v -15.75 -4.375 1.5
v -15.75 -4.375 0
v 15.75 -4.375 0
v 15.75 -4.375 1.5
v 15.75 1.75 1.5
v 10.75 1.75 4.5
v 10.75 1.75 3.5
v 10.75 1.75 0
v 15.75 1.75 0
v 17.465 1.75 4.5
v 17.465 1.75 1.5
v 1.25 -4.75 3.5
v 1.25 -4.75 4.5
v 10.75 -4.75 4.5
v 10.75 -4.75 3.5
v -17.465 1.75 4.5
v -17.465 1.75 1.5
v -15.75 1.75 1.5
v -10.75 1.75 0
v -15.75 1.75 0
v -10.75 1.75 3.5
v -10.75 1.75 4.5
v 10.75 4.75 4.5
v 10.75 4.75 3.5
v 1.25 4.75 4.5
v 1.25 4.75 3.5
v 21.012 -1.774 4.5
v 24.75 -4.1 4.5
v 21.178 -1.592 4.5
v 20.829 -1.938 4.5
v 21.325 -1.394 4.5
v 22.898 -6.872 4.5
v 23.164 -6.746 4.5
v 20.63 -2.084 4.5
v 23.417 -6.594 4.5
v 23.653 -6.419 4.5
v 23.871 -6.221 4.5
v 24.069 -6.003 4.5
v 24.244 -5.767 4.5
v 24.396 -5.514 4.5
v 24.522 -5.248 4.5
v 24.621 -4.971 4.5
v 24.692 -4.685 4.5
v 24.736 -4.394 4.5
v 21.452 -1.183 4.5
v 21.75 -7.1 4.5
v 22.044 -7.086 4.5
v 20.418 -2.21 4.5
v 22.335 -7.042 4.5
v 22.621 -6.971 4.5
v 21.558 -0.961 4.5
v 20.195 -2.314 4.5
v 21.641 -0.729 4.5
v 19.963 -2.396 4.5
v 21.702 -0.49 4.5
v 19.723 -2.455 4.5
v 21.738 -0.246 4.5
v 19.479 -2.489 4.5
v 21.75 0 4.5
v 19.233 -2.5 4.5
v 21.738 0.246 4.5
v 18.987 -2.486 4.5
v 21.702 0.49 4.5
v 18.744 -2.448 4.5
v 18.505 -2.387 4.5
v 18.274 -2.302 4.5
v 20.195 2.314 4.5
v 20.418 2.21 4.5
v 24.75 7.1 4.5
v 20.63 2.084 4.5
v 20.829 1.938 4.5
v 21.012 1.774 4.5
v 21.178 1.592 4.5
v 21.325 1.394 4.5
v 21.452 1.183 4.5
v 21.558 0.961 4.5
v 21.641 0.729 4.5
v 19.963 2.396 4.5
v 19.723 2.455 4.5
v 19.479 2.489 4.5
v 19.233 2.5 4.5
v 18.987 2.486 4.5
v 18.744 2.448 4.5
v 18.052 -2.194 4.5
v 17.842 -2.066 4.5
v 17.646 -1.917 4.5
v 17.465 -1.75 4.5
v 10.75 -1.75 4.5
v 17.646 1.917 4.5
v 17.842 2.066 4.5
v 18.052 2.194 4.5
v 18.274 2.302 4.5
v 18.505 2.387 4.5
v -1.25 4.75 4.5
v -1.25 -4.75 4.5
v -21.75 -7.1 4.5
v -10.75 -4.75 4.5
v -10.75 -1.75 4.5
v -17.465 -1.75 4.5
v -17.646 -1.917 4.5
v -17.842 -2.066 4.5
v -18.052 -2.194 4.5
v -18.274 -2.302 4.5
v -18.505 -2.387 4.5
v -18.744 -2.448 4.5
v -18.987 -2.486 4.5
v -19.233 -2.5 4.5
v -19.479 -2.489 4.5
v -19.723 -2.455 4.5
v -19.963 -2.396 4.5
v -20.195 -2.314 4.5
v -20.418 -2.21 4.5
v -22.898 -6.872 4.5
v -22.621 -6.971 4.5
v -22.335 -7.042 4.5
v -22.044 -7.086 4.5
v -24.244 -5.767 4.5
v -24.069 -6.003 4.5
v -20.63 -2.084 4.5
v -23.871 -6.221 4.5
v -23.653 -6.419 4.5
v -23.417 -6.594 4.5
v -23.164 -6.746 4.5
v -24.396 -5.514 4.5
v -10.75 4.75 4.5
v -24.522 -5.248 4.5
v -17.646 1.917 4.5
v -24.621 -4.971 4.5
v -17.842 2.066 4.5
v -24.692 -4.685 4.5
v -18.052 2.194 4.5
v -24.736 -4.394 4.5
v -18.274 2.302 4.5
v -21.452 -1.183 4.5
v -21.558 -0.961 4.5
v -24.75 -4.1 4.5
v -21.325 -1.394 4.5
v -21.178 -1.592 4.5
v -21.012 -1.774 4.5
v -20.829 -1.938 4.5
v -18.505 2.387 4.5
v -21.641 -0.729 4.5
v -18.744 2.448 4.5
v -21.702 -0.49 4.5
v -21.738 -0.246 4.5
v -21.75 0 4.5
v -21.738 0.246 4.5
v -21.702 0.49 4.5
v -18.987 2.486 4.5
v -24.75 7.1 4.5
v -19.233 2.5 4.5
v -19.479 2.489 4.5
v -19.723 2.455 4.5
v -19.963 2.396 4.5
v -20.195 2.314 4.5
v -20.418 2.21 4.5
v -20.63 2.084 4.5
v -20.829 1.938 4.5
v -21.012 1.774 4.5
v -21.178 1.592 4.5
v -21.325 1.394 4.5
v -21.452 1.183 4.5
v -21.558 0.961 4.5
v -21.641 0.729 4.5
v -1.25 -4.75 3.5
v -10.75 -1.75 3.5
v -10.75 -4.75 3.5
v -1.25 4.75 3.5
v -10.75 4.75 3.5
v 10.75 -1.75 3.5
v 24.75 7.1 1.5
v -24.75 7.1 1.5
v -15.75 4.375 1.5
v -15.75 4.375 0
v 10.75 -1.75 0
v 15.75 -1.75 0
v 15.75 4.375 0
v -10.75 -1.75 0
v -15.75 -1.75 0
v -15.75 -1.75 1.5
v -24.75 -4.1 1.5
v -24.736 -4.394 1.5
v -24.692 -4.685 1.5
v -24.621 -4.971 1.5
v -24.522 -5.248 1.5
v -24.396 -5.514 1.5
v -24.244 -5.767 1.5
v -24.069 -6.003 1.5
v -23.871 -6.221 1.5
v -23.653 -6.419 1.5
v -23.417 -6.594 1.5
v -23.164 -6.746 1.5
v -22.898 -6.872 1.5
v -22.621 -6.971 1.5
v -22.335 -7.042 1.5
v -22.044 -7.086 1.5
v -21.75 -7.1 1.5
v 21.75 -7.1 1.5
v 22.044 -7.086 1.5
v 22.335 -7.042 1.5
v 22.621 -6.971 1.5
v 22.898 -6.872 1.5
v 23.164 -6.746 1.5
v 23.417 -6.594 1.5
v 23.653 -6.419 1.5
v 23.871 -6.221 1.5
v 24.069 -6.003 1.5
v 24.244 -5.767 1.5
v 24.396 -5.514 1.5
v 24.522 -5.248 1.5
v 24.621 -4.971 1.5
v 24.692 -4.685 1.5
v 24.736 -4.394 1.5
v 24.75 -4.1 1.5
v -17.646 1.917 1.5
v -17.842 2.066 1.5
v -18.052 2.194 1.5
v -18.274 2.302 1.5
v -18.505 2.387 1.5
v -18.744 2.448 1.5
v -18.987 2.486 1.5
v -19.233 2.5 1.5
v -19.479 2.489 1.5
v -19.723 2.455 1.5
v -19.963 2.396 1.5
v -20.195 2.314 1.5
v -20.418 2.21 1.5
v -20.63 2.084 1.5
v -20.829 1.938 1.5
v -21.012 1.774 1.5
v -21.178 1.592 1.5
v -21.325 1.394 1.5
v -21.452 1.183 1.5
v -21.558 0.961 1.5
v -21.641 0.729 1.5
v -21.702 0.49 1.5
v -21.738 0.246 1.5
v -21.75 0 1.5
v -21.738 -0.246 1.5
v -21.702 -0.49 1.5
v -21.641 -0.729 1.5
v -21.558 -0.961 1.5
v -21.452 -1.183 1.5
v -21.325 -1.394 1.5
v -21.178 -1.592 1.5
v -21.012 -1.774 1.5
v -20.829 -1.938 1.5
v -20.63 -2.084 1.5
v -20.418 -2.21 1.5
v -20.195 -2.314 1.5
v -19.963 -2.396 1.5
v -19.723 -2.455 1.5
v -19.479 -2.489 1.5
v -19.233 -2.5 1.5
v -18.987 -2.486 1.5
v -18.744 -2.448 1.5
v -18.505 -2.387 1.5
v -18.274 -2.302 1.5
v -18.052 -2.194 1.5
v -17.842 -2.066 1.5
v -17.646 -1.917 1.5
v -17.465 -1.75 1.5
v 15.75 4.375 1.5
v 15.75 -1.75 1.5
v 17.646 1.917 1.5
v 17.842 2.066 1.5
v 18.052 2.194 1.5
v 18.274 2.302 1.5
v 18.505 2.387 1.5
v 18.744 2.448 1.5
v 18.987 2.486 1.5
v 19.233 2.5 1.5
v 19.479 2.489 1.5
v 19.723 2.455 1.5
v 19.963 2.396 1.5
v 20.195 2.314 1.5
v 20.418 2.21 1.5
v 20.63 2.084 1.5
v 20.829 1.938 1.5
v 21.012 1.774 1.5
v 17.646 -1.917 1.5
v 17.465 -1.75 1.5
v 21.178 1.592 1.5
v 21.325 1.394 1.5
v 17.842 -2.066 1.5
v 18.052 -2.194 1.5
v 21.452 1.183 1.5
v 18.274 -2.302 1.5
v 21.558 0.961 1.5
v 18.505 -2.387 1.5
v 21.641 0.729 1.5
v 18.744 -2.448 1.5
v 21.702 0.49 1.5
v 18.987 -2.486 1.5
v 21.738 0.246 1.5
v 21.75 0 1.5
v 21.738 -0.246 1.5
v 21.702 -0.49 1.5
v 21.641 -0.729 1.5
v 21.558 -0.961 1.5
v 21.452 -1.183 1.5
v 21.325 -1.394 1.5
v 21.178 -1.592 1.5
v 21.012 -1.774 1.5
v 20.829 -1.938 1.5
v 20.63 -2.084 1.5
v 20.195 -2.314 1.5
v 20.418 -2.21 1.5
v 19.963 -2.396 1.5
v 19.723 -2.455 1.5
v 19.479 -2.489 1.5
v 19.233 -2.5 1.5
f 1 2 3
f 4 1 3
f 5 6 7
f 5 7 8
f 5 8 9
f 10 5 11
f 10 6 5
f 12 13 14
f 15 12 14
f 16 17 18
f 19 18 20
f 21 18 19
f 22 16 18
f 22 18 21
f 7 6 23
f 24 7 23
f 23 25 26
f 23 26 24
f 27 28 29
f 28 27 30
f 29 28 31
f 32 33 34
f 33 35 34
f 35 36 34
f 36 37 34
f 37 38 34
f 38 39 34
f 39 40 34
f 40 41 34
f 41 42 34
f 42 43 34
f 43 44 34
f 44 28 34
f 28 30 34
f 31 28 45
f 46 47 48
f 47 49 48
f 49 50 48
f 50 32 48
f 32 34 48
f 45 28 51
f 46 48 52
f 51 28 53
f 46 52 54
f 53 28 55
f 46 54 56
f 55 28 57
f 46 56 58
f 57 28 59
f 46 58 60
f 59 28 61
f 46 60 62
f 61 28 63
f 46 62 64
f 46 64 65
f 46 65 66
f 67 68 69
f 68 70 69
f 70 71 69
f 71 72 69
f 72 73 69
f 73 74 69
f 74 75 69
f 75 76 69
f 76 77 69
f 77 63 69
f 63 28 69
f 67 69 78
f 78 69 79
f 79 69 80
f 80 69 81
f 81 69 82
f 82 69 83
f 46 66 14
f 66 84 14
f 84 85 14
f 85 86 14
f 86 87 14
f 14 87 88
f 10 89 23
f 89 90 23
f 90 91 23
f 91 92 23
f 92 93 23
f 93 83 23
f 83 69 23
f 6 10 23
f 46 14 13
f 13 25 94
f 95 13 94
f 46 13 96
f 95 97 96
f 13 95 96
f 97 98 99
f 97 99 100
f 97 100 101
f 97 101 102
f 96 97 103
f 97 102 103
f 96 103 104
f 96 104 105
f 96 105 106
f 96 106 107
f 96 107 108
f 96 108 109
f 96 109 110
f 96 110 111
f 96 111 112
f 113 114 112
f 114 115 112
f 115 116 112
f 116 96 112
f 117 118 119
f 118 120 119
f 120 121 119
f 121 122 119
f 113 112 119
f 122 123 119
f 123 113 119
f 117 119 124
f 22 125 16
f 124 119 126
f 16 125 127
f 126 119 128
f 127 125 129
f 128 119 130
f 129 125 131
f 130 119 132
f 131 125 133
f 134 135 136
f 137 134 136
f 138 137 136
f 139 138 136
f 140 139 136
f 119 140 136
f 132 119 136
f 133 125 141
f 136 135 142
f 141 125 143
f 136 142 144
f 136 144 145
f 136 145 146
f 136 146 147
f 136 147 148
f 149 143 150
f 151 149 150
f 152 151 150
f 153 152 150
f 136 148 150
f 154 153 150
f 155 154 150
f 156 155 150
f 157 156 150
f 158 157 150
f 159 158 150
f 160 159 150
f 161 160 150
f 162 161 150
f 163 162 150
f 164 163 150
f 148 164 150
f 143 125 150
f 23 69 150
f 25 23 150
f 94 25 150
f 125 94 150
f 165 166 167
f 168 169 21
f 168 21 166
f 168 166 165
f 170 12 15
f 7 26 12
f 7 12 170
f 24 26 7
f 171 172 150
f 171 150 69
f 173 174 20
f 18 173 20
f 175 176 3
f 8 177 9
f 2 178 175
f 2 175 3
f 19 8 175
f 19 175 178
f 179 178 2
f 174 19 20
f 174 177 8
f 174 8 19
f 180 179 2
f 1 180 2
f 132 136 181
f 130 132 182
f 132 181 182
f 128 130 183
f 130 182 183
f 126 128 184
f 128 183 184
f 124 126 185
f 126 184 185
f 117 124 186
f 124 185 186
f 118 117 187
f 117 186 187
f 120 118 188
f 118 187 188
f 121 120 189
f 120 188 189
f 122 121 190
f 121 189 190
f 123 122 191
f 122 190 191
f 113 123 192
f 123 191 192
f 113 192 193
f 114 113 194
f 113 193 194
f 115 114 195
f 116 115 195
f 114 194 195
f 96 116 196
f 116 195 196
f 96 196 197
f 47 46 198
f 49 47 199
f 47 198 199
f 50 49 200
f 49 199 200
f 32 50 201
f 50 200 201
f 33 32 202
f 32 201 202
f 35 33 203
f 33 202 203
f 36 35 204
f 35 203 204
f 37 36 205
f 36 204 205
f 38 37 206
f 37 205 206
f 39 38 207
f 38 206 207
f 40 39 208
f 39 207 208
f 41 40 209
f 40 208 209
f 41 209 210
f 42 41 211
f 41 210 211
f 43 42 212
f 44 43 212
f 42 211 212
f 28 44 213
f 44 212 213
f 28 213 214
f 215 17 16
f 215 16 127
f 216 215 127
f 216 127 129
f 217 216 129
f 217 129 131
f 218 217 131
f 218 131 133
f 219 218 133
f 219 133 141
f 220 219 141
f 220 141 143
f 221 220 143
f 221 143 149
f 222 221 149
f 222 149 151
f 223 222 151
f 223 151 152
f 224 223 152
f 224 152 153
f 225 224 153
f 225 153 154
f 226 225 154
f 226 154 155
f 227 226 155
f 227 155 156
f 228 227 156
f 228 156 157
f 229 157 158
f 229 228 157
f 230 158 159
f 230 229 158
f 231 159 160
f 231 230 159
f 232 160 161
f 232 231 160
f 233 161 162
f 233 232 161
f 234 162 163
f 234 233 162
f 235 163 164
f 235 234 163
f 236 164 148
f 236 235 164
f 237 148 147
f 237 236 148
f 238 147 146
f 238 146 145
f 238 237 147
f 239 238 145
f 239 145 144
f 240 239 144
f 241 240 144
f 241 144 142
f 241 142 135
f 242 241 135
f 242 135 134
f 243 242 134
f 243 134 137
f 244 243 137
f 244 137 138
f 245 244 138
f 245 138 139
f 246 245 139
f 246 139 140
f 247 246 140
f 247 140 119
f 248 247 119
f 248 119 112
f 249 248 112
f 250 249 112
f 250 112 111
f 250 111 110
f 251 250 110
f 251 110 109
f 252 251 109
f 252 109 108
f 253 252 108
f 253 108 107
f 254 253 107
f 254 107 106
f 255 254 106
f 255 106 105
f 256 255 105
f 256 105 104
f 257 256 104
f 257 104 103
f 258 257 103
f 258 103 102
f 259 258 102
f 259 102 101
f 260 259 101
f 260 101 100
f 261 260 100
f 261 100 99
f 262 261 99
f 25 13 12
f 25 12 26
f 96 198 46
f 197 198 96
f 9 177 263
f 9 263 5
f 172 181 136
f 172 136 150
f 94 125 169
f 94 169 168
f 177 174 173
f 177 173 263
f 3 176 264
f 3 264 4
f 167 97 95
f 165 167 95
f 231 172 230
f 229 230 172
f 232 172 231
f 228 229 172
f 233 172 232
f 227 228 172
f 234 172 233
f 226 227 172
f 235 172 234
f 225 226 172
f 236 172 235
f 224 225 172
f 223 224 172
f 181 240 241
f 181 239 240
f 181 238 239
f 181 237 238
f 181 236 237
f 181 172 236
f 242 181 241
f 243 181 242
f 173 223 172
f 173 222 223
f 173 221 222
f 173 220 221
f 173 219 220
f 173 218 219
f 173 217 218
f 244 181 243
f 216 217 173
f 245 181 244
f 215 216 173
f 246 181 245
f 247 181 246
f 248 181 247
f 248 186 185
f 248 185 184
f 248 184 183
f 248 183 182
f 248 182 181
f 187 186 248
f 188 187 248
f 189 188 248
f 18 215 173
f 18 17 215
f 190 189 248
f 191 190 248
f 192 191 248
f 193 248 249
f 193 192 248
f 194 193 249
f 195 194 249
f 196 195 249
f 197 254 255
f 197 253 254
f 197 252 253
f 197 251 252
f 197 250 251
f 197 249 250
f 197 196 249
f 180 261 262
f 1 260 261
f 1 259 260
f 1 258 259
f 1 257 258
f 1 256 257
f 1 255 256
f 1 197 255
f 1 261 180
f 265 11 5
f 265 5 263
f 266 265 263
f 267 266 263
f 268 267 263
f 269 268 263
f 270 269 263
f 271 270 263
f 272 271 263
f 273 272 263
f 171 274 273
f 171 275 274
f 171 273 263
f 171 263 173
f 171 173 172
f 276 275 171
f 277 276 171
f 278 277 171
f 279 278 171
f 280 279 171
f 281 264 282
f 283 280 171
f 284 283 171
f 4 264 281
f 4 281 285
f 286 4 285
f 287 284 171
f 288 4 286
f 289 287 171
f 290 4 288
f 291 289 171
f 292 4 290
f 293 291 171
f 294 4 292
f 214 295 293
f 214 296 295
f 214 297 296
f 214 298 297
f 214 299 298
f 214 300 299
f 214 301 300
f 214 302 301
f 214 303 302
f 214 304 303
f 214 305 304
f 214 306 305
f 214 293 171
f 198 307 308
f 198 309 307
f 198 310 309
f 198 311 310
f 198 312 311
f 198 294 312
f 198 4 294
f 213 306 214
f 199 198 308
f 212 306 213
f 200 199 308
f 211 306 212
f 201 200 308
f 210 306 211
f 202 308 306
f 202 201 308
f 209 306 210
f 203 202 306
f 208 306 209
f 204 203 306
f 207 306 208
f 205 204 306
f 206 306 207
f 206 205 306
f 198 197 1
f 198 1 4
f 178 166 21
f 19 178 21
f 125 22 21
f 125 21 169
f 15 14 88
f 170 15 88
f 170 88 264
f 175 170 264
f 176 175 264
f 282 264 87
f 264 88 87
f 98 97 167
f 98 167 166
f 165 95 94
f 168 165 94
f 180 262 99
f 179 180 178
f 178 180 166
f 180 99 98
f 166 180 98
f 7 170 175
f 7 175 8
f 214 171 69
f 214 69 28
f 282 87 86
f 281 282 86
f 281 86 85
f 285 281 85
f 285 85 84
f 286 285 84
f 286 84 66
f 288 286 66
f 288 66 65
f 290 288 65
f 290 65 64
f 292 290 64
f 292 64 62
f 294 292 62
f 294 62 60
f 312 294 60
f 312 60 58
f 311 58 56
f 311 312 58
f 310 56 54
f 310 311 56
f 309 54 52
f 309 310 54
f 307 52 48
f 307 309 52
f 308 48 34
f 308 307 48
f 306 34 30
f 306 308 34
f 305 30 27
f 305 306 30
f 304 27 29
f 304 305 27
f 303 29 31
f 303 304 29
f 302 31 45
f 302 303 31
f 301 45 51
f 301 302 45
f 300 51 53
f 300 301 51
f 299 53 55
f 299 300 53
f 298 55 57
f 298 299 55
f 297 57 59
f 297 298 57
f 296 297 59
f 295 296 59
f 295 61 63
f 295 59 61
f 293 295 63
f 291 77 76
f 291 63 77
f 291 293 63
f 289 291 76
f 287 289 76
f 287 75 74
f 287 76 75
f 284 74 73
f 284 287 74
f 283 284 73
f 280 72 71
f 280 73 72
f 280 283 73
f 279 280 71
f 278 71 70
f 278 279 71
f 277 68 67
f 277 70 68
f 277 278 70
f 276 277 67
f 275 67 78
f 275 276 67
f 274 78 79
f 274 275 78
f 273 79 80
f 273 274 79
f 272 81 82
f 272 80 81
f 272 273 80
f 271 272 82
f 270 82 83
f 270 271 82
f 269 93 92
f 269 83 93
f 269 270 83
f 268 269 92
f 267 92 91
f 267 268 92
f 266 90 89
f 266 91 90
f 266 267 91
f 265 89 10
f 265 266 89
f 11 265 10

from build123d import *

# Parameters (mm, degrees)
SKETCH_R        = 2.5
PAD_DEPTH       = 4.5
SKETCH001_W     = 9.5
SKETCH001_H     = 9.5
POCKET_DEPTH    = 1
SKETCH002_W     = 2
SKETCH002_H     = 3.5
POCKET001_DEPTH = 5
SKETCH003_W     = 7
SKETCH003_H     = 3.5
POCKET002_DEPTH = 5
SKETCH004_W     = 52
SKETCH004_H     = 16
SKETCH004_W_2   = 31.5
SKETCH004_H_2   = 8.75
POCKET003_DEPTH = 1.5


with BuildPart() as part:
    # Sketch → Pad (new body)
    with BuildSketch(Plane.XY):
        with BuildLine():
            Line((-24.75, 7.1), (24.75, 7.1))
            Line((24.75, 7.1), (24.75, -4.1))
            ThreePointArc((21.75, -7.1), (23.87132, -6.22132), (24.75, -4.1))
            Line((21.75, -7.1), (-21.75, -7.1))
            ThreePointArc((-24.75, -4.1), (-23.87132, -6.22132), (-21.75, -7.1))
            Line((-24.75, -4.1), (-24.75, 7.1))
        make_face()
        with Locations((-19.25, 0)):
            Circle(SKETCH_R, mode=Mode.SUBTRACT)
        with Locations((19.25, 0)):
            Circle(SKETCH_R, mode=Mode.SUBTRACT)
    extrude(amount=PAD_DEPTH)

    # Sketch001 (on DatumPlane) → Pocket (cut)
    with BuildSketch(Plane.XY.offset(4.5)):
        with Locations((-6, 0)):
            Rectangle(SKETCH001_W, SKETCH001_H)
        with Locations((6, 0)):
            Rectangle(SKETCH001_W, SKETCH001_H)
    extrude(amount=-POCKET_DEPTH, mode=Mode.SUBTRACT)

    # Sketch002 (on DatumPlane) → Pocket001 (cut)
    with BuildSketch(Plane.XY.offset(4.5)):
        with Locations((-11.75, 0)):
            Rectangle(SKETCH002_W, SKETCH002_H)
        with Locations((11.75, 0)):
            Rectangle(SKETCH002_W, SKETCH002_H)
        with Locations((-16.75, 0)):
            Rectangle(SKETCH002_W, SKETCH002_H)
        with Locations((16.75, 0)):
            Rectangle(SKETCH002_W, SKETCH002_H)
    extrude(amount=-POCKET001_DEPTH, mode=Mode.SUBTRACT)

    # Sketch003 (on DatumPlane) → Pocket002 (cut)
    with BuildSketch(Plane.XY.offset(4.5)):
        with Locations((-14.25, 0)):
            Rectangle(SKETCH003_W, SKETCH003_H)
        with Locations((14.25, 0)):
            Rectangle(SKETCH003_W, SKETCH003_H)
    extrude(amount=-POCKET002_DEPTH, mode=Mode.SUBTRACT)

    # Sketch004 (on DatumPlane) → Pocket003 (cut)
    with BuildSketch(Plane(origin=(0, 0, 0), x_dir=(1, 0, 0), z_dir=(0, 0, -1))):
        Rectangle(SKETCH004_W, SKETCH004_H)
        Rectangle(SKETCH004_W_2, SKETCH004_H_2, mode=Mode.SUBTRACT)
    extrude(amount=-POCKET003_DEPTH, mode=Mode.SUBTRACT)


solid = part.part
